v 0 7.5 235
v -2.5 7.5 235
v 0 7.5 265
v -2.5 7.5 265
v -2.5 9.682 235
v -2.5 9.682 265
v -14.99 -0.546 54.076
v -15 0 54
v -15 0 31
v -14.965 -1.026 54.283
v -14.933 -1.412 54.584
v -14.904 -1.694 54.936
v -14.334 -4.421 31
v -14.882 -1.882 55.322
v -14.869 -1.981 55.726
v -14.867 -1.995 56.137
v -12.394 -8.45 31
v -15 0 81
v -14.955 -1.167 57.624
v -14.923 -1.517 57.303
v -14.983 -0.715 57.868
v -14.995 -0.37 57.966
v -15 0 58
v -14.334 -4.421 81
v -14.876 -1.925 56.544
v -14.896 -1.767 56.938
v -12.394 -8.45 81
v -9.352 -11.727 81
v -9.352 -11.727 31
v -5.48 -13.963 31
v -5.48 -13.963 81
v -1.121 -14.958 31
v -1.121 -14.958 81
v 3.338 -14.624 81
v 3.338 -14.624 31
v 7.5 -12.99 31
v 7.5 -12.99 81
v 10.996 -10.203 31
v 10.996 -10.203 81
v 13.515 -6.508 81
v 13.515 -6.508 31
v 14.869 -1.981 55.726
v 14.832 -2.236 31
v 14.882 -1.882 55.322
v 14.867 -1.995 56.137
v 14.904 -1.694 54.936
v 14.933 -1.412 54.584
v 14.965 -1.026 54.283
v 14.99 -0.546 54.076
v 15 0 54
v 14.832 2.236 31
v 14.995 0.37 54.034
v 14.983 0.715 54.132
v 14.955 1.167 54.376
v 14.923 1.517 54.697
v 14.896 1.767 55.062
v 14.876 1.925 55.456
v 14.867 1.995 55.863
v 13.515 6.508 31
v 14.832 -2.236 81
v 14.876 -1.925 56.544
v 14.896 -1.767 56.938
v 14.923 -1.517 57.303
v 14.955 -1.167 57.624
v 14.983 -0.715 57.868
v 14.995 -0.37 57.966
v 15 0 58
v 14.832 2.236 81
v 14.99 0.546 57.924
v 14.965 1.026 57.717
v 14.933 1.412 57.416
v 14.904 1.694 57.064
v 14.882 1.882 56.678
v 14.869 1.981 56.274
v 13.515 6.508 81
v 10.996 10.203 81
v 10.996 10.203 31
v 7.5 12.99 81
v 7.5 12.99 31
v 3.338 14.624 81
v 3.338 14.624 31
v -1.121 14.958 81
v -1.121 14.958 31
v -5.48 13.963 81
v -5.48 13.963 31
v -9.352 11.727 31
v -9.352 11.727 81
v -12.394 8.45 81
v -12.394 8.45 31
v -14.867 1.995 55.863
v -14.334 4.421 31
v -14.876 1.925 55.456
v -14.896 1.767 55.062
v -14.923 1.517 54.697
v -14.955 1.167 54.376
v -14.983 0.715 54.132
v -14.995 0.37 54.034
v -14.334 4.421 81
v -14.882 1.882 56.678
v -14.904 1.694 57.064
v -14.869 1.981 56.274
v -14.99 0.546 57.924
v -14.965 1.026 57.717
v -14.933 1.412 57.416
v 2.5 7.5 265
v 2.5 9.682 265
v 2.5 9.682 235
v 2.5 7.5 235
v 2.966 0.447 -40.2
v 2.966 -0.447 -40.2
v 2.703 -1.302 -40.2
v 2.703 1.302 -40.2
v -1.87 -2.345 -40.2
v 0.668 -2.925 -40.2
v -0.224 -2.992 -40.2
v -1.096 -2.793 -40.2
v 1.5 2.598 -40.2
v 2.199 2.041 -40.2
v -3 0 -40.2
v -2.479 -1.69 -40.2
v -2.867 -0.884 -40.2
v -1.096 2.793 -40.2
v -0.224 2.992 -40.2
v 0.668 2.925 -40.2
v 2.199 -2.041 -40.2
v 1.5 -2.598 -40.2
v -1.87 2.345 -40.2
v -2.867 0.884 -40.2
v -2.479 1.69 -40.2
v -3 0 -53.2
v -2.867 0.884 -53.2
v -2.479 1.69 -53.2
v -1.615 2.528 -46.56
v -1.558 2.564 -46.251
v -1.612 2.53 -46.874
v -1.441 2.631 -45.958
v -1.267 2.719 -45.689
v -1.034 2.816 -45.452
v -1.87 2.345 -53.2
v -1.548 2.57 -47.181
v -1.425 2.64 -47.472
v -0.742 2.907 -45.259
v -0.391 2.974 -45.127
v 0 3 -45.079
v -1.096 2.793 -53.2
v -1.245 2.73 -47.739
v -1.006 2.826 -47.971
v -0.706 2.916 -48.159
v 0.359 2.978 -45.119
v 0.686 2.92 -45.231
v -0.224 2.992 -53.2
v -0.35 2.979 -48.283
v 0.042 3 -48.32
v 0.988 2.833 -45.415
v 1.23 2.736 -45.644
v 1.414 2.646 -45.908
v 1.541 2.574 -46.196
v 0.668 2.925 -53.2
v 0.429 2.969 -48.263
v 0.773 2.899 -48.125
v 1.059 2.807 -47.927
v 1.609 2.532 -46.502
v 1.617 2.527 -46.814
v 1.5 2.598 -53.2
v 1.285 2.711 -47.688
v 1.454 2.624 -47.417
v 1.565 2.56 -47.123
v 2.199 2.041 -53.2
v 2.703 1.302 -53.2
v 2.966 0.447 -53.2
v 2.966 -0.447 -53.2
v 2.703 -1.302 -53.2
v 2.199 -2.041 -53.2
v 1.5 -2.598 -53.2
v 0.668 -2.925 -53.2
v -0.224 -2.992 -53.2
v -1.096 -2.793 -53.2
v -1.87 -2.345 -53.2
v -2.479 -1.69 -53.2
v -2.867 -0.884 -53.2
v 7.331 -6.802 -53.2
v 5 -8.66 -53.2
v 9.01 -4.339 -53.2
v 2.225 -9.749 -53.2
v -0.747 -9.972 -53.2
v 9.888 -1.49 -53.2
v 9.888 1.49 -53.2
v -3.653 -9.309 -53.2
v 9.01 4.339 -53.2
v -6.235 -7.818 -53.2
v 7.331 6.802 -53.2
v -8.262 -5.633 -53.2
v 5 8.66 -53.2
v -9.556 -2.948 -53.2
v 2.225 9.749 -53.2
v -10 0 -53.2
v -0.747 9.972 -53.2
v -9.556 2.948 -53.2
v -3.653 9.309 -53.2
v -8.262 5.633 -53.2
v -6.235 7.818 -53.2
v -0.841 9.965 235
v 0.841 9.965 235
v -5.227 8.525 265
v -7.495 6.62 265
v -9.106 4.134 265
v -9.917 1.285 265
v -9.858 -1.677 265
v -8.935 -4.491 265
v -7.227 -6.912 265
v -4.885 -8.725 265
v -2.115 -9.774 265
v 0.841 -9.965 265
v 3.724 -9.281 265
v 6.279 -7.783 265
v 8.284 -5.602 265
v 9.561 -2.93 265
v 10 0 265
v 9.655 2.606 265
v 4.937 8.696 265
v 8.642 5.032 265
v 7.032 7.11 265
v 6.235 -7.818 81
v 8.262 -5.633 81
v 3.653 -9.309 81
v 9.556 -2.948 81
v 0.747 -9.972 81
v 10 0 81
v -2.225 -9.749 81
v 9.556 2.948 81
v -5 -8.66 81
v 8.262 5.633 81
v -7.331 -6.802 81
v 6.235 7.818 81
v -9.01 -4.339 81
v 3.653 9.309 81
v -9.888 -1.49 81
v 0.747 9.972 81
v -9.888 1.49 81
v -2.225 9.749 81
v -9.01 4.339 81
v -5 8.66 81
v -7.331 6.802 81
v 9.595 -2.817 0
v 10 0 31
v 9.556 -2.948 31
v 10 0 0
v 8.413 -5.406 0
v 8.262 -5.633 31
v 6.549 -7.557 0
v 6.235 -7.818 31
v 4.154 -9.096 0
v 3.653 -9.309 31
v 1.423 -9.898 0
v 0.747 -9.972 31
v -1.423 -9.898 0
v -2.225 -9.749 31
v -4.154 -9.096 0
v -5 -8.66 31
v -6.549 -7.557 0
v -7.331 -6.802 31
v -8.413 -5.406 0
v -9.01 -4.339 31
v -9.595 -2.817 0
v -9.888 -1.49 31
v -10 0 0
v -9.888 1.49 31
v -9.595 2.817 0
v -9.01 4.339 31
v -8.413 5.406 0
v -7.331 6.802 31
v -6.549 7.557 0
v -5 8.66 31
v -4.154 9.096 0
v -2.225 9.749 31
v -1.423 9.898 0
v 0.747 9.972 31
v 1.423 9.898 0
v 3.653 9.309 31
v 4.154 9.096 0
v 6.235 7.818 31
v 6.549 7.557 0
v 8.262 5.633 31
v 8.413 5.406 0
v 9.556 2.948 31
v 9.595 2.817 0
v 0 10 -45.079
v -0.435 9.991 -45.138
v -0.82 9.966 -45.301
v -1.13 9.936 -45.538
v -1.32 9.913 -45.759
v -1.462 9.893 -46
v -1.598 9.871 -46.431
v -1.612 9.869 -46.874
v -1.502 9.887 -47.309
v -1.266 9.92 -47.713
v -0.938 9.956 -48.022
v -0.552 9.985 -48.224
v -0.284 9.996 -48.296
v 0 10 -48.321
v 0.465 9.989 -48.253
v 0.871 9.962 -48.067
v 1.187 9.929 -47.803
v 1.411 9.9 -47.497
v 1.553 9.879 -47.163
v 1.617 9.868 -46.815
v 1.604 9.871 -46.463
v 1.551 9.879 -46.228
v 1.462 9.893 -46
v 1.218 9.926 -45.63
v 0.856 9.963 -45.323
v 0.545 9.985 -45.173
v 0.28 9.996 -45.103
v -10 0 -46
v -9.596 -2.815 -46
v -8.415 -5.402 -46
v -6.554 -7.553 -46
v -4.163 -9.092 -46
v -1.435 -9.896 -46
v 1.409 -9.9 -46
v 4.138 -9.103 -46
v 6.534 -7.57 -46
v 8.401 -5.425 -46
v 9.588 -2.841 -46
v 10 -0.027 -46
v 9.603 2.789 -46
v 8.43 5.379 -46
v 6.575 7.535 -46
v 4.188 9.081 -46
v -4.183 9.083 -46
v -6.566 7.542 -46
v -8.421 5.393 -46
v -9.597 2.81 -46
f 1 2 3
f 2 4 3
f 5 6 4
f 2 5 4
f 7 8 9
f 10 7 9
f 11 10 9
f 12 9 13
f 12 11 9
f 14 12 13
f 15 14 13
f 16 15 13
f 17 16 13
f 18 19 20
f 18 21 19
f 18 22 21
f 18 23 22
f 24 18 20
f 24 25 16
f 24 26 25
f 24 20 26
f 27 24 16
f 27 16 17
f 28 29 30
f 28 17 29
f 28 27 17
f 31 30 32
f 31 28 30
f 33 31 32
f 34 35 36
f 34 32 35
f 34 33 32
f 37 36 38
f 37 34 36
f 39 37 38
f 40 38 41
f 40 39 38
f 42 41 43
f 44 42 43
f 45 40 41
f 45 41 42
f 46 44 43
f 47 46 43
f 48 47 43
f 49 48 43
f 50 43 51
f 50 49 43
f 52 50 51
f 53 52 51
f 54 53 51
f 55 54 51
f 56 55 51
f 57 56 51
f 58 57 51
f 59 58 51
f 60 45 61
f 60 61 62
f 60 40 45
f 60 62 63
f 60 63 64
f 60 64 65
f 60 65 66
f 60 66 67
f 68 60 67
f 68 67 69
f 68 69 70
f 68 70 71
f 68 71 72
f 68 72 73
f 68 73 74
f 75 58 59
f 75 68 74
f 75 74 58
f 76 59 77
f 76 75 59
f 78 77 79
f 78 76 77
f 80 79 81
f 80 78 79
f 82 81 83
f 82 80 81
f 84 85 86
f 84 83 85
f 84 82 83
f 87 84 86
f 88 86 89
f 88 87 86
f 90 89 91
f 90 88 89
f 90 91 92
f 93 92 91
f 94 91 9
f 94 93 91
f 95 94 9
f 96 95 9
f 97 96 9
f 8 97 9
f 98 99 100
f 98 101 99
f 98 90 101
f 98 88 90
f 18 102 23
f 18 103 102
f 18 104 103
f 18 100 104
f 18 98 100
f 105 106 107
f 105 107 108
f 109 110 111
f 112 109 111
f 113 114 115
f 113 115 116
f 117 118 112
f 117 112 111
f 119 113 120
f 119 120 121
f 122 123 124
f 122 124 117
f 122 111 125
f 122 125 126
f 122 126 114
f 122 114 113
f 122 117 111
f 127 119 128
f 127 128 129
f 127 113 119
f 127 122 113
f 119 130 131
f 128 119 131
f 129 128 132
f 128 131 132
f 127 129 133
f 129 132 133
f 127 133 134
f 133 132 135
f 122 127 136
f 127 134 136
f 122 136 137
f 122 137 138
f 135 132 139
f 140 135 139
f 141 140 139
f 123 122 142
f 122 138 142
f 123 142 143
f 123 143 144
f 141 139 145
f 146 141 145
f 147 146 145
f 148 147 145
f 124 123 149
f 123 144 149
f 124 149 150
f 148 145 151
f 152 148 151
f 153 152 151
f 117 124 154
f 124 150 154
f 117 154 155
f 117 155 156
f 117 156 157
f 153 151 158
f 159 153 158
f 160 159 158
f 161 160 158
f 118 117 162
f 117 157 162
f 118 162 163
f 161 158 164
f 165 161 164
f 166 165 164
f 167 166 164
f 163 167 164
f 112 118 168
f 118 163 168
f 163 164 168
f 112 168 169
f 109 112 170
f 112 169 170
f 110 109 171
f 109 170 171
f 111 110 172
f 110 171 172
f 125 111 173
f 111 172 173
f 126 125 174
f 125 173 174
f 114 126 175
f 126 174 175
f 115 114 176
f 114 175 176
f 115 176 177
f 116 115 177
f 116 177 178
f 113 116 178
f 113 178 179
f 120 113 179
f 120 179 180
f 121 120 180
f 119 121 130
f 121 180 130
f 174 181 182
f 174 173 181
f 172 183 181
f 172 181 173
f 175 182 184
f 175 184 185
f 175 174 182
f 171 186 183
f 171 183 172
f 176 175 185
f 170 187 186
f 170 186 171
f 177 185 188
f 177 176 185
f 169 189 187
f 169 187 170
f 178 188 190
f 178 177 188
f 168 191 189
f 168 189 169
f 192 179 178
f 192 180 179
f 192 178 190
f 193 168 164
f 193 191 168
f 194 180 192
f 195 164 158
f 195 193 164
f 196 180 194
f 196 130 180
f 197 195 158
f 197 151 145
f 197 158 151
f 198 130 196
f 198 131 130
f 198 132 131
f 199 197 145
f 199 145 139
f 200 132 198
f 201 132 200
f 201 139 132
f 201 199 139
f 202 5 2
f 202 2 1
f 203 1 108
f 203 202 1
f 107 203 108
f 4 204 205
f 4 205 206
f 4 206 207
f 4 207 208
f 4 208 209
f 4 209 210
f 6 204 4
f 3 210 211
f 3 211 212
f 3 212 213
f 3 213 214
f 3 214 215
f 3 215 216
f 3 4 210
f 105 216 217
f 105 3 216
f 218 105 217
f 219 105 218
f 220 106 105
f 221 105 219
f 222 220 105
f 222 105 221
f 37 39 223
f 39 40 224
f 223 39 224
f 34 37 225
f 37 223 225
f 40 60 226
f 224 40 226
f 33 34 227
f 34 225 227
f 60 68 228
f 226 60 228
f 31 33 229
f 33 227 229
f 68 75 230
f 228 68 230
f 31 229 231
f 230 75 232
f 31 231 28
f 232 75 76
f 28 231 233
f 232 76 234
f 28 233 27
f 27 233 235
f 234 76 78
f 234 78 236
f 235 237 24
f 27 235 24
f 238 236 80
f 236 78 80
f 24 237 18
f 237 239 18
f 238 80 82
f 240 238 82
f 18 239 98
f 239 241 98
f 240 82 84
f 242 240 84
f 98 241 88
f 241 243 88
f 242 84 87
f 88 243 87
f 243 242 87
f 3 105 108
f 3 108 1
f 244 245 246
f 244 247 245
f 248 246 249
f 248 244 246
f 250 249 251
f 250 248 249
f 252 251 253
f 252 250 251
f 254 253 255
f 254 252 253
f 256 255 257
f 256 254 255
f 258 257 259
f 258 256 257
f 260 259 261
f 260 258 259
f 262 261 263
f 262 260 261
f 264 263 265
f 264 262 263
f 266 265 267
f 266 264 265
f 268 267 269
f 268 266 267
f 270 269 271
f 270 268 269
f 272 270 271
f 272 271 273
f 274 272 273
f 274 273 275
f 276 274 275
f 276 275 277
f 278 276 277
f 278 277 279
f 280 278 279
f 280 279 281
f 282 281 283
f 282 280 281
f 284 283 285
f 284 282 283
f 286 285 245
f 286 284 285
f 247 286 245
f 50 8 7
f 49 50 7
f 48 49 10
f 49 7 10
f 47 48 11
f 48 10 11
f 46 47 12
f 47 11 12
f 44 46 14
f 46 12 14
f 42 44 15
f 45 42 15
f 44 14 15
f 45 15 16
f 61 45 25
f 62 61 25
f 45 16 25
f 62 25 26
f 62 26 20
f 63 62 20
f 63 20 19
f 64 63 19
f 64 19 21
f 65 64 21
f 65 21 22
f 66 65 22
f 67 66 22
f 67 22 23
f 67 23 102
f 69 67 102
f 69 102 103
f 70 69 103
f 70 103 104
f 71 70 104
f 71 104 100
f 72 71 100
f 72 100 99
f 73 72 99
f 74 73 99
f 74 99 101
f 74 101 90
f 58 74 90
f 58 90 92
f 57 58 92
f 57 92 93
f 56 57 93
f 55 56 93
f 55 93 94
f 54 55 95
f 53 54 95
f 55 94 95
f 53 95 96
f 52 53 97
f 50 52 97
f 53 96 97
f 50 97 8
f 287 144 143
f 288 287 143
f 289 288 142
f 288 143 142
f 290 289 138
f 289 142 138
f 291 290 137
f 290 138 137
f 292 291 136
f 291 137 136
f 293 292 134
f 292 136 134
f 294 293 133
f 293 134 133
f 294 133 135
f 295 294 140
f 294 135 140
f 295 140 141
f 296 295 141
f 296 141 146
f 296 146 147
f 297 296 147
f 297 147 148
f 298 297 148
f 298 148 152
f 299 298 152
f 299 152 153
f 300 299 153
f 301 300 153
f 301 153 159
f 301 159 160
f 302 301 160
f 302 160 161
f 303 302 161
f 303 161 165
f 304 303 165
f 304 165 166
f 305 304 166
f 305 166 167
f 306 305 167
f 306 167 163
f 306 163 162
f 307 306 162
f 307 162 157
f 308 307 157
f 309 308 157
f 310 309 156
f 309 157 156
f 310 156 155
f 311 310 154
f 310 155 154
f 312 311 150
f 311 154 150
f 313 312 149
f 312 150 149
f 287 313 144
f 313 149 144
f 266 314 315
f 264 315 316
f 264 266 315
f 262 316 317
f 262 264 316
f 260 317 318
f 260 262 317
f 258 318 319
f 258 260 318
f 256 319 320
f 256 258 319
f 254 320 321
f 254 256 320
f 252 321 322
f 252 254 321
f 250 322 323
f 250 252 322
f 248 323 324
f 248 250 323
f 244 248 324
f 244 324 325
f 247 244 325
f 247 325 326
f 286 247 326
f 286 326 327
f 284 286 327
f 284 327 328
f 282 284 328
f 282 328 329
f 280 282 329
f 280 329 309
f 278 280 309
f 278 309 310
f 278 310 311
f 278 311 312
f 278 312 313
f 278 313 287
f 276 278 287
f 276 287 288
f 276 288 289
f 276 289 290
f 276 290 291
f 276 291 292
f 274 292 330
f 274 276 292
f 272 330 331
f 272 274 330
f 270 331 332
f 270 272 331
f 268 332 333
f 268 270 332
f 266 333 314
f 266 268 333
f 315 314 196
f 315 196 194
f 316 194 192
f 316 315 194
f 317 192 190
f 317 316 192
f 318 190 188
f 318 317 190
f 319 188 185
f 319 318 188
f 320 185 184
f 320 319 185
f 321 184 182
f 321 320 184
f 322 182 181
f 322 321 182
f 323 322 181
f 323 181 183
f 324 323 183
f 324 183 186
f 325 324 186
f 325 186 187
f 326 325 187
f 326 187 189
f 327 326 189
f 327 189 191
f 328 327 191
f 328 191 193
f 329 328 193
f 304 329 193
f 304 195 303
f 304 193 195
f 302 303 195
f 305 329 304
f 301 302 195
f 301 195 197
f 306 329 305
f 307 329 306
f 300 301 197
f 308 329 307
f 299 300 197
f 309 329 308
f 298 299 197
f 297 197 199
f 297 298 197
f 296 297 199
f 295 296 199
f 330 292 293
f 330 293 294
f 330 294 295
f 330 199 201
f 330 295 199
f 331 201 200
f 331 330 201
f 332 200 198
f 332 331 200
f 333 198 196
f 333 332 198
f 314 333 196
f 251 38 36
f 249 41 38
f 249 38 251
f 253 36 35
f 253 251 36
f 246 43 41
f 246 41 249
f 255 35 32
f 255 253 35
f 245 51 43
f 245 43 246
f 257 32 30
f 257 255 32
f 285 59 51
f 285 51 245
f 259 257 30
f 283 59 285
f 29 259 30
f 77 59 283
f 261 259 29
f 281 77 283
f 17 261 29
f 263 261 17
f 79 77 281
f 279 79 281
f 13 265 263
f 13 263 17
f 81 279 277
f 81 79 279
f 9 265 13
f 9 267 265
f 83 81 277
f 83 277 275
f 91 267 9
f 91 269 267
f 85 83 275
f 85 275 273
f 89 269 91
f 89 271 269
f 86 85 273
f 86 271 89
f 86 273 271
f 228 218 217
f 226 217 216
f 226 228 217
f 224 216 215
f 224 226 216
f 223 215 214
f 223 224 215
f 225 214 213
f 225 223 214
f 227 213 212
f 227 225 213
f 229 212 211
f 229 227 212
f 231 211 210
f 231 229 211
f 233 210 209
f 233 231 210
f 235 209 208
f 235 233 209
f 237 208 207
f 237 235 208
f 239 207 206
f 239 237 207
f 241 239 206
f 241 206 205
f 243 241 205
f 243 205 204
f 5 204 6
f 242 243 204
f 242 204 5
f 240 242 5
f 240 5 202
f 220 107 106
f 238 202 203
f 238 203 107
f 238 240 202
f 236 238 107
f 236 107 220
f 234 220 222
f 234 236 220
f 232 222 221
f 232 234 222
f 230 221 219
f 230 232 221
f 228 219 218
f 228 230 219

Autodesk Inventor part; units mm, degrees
sketch "Sketch1" plane through (0, 0, 0) normal (0, 0, 1) x (1, 0, 0)
  circle A0 centre (0, 0) radius 10
  dimension "d0" = 20
extrude "Extrusion1" add sketch "Sketch1" along normal blind 65
sketch "Sketch2" plane through (0, 0, 65) normal (0, 0, 1) x (1, 0, 0)
  circle A0 centre (0, 0) radius 10
  dimension "d3" = 20
extrude "Extrusion2" add sketch "Sketch2" along normal blind 150
sketch "Sketch3" plane through (0, 0, 0) normal (0, 0, -1) x (-1, 0, 0)
  circle A0 centre (0, 0) radius 10
extrude "Extrusion3" add sketch "Sketch3" along normal blind 100
sketch "Sketch6" plane through (0, 0, -100) normal (0, 0, -1) x (-1, 0, 0)
  circle A0 centre (0, 0) radius 10
extrude "Extrusion4" cut sketch "Sketch6" against normal blind 54
sketch "Sketch7" plane through (0, 0, 215) normal (0, 0, 1) x (1, 0, 0)
  circle A0 centre (0, 0) radius 10
extrude "Extrusion5" add sketch "Sketch7" along normal blind 50
ref_plane "Work Plane3" through (0, 0, 81) normal (0, 0, -1) x (-1, 0, 0)
sketch "Sketch9" plane through (0, 0, 81) normal (0, 0, -1) x (-1, 0, 0)
  circle A0 centre (0, 0) radius 15
  dimension "d29" = 30
extrude "Extrusion7" add sketch "Sketch9" along normal blind 50
sketch "Sketch12" plane through (0, 0, -46) normal (0, 0, -1) x (-1, 0, 0)
  circle A0 centre (0, 0) radius 10
extrude "Extrusion8" add sketch "Sketch12" along normal blind 7.2
sketch "Sketch16" plane through (0, 0, 81) normal (0, 0, -1) x (-1, 0, 0)
  circle A0 centre (0, 0) radius 15 projected
  point P0 (-15, 0)
ref_plane "Work Plane4" through (15, 0, 81) normal (1, 0, 0) x (0, 1, 0)
sketch "Sketch17" plane through (15, 0, 81) normal (1, 0, 0) x (0, 1, 0)
  line L0 (-15, -50) -> (15, -50) projected
  point P0 (0, -81)
  point P1 (0, -25)
  dimension "d67" = 25
hole "Hole4" at (15, 0, 56) direction (-1, 0, 0) diameter 4 end through all
sketch "Sketch18" plane through (0, 0, 265) normal (0, 0, 1) x (1, 0, 0)
  circle A0 centre (0, 0) radius 10 projected
  line L0 (0, 10) -> (-2.5, 10)
  line L1 (-2.5, 10) -> (-2.5, 7.5)
  line L2 (-2.5, 7.5) -> (0, 7.5)
  line L3 (0, 10) -> (2.5, 10)
  line L4 (2.5, 10) -> (2.5, 7.5)
  line L5 (2.5, 7.5) -> (0, 7.5)
  point P0 (0, 7.5)
  point P1 (2.5, 9.6825)
  point P2 (-2.5, 9.6825)
  dimension "d75" = 5
  dimension "d76" = 2.5
  dimension "d77" = 10
extrude "Extrusion12" cut sketch "Sketch18" against normal blind 30 contours L4 L5 L2 L1 A0 picked at (1.3922, 8.2862)
sketch "Sketch19" plane through (0, 0, -53.2) normal (0, 0, -1) x (-1, 0, 0)
  circle A0 centre (0, 0) radius 3
  dimension "d80" = 6
extrude "Extrusion13" cut sketch "Sketch19" against normal blind 13
sketch "Sketch20" plane through (0, 0, -53.2) normal (0, 0, -1) x (-1, 0, 0)
  point P0 (0, 0)
  point P1 (0, 10)
ref_plane "Work Plane5" through (0, 10, -53.2) normal (0, 1, 0) x (-1, 0, 0)
sketch "Sketch21" plane through (0, 10, -53.2) normal (0, 1, 0) x (-1, 0, 0)
  line L0 (-10, 0) -> (10, 0) projected
  point P0 (0, 53.2)
  point P1 (0, 6.5)
  dimension "d83" = 6.5
hole "Hole5" at (0, 10, -46.7) direction (0, -1, 0) diameter 3.242 depth 9 tip angle 118 thread size "M4x0.7" class "6H" standard "ISO Metric profile"
equation "\"d73\" = Thickness"
equation "\"BendRadius\" = Thickness"
equation "\"BendReliefWidth\" = Thickness"
equation "\"BendReliefDepth\" = 0.5 * Thickness"
equation "\"CornerReliefSize\" = 4 * Thickness"
equation "\"MinimumRemnant\" = 2 * Thickness"
equation "\"TransitionRadius\" = BendRadius"
equation "\"JacobiRadiusSize\" = BendRadius"
equation "\"GapSize\" = Thickness"
equation "\"Thickness\" = 0.5"
properties part number "Rough draft shaft"
